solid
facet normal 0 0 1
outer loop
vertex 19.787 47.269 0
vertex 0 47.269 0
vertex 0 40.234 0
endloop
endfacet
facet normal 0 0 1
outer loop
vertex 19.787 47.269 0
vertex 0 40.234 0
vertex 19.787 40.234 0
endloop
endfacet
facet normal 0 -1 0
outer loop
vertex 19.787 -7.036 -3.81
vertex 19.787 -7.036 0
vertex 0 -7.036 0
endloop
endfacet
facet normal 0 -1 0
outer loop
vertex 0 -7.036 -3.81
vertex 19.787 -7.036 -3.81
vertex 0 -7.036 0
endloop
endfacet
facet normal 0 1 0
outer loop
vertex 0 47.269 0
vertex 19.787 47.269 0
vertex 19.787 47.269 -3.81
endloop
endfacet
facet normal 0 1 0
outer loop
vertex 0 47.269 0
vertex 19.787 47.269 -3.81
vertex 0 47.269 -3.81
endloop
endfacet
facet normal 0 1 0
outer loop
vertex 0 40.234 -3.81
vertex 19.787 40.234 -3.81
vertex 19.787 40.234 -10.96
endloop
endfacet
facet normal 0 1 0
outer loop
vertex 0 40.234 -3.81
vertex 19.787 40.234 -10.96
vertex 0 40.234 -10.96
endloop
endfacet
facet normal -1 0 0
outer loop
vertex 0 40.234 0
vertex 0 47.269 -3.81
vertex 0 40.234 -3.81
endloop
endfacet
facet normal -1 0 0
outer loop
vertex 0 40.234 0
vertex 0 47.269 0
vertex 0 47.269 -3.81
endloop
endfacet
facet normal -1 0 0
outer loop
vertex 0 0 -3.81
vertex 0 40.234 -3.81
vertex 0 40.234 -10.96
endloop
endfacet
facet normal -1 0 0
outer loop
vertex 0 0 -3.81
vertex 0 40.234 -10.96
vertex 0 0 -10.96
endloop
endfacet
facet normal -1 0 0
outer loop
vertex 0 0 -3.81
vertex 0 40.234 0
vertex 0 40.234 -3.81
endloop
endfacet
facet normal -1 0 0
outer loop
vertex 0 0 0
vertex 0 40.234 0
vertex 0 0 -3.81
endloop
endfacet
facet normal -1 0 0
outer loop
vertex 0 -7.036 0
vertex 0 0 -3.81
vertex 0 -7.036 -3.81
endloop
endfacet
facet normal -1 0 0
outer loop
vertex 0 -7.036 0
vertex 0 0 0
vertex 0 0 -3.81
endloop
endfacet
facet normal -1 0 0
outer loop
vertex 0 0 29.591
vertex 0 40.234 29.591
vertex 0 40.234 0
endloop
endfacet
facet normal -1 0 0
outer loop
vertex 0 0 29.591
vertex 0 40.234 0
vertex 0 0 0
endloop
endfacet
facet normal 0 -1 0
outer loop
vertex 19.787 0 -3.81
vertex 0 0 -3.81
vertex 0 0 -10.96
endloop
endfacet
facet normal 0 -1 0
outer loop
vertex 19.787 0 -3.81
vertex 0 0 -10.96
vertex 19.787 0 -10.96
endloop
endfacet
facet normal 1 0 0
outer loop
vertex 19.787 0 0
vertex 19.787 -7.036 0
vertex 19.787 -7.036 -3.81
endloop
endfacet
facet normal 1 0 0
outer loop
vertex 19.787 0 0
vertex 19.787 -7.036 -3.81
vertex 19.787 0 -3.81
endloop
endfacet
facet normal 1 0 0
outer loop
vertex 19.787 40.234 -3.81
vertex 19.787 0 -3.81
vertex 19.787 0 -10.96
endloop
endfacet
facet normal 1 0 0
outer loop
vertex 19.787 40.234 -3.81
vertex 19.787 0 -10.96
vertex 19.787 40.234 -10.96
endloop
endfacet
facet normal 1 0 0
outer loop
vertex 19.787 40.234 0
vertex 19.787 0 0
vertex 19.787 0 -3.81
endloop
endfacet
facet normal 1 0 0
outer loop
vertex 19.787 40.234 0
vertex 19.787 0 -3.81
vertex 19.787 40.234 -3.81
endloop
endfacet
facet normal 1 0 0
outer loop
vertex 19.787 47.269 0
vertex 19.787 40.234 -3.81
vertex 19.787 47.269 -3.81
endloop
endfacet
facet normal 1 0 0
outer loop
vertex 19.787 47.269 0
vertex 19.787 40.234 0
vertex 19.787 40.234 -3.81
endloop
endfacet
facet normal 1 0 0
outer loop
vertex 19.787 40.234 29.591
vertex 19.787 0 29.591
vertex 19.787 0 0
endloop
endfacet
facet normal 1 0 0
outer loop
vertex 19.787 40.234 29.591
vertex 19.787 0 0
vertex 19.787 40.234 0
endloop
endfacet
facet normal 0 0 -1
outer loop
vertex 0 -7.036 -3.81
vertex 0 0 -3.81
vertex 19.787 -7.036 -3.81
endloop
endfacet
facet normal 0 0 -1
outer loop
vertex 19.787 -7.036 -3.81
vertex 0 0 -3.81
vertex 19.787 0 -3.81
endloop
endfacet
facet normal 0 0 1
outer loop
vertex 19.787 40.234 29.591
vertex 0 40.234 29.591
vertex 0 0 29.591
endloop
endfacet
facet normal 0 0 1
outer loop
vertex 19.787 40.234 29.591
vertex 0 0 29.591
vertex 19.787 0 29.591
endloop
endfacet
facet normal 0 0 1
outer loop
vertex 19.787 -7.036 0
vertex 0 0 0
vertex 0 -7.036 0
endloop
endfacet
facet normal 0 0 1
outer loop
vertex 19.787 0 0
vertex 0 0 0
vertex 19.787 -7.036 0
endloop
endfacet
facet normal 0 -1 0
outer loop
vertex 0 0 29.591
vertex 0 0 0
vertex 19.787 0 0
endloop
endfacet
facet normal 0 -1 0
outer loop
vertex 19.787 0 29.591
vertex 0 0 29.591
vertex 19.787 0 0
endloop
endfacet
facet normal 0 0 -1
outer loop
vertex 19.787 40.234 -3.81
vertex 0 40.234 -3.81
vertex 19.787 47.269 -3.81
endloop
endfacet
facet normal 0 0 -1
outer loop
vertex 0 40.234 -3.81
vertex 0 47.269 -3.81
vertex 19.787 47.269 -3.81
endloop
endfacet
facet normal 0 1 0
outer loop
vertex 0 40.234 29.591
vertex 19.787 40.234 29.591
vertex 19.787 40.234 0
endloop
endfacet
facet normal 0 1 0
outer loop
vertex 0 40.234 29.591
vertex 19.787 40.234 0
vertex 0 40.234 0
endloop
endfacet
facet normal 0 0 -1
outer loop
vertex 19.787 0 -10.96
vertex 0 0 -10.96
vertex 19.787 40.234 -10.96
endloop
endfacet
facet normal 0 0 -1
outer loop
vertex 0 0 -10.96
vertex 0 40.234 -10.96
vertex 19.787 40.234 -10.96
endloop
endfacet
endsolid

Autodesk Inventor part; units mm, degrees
ref_plane "YZ Plane" through (0, 0, 0) normal (1, 0, 0) x (0, 1, 0)
ref_plane "XZ Plane" through (0, 0, 0) normal (0, 1, 0) x (-1, 0, 0)
ref_plane "XY Plane" through (0, 0, 0) normal (0, 0, 1) x (1, 0, 0)
sketch "Sketch1" plane through (0, 0, 0) normal (0, 0, 1) x (1, 0, 0)
  line L0 (0, 0) -> (19.7866, 0)
  line L1 (19.7866, 0) -> (19.7866, 40.2336)
  line L2 (19.7866, 40.2336) -> (0, 40.2336)
  line L3 (0, 40.2336) -> (0, 0)
  line L4 (0, 0) -> (19.7866, 0)
  line L5 (19.7866, 0) -> (19.7866, -7.0358)
  line L6 (19.7866, -7.0358) -> (0, -7.0358)
  line L7 (0, -7.0358) -> (0, 0)
  line L8 (19.7866, 20.1168) -> (0, 20.1168) construction
  line L9 (19.7866, 40.2336) -> (19.7866, 47.2694)
  line L10 (19.7866, 47.2694) -> (0, 47.2694)
  line L11 (0, 47.2694) -> (0, 40.2336)
  dimension "d0" = 19.7866
  dimension "d1" = 40.2336
  dimension "d2" = 7.0358
extrude "Extrusion1" add sketch "Sketch1" along normal blind 29.591 contours L3 L2 L1 L0
extrude "Extrusion2" add sketch "Sketch1" against normal blind 3.81 contours L0 L5 L6 L7 | L11 L10 L9 L2
extrude "Extrusion3" add sketch "Sketch1" against normal blind 10.9601 contours L3 L2 L1 L0
properties part number "ServoSimplified"
